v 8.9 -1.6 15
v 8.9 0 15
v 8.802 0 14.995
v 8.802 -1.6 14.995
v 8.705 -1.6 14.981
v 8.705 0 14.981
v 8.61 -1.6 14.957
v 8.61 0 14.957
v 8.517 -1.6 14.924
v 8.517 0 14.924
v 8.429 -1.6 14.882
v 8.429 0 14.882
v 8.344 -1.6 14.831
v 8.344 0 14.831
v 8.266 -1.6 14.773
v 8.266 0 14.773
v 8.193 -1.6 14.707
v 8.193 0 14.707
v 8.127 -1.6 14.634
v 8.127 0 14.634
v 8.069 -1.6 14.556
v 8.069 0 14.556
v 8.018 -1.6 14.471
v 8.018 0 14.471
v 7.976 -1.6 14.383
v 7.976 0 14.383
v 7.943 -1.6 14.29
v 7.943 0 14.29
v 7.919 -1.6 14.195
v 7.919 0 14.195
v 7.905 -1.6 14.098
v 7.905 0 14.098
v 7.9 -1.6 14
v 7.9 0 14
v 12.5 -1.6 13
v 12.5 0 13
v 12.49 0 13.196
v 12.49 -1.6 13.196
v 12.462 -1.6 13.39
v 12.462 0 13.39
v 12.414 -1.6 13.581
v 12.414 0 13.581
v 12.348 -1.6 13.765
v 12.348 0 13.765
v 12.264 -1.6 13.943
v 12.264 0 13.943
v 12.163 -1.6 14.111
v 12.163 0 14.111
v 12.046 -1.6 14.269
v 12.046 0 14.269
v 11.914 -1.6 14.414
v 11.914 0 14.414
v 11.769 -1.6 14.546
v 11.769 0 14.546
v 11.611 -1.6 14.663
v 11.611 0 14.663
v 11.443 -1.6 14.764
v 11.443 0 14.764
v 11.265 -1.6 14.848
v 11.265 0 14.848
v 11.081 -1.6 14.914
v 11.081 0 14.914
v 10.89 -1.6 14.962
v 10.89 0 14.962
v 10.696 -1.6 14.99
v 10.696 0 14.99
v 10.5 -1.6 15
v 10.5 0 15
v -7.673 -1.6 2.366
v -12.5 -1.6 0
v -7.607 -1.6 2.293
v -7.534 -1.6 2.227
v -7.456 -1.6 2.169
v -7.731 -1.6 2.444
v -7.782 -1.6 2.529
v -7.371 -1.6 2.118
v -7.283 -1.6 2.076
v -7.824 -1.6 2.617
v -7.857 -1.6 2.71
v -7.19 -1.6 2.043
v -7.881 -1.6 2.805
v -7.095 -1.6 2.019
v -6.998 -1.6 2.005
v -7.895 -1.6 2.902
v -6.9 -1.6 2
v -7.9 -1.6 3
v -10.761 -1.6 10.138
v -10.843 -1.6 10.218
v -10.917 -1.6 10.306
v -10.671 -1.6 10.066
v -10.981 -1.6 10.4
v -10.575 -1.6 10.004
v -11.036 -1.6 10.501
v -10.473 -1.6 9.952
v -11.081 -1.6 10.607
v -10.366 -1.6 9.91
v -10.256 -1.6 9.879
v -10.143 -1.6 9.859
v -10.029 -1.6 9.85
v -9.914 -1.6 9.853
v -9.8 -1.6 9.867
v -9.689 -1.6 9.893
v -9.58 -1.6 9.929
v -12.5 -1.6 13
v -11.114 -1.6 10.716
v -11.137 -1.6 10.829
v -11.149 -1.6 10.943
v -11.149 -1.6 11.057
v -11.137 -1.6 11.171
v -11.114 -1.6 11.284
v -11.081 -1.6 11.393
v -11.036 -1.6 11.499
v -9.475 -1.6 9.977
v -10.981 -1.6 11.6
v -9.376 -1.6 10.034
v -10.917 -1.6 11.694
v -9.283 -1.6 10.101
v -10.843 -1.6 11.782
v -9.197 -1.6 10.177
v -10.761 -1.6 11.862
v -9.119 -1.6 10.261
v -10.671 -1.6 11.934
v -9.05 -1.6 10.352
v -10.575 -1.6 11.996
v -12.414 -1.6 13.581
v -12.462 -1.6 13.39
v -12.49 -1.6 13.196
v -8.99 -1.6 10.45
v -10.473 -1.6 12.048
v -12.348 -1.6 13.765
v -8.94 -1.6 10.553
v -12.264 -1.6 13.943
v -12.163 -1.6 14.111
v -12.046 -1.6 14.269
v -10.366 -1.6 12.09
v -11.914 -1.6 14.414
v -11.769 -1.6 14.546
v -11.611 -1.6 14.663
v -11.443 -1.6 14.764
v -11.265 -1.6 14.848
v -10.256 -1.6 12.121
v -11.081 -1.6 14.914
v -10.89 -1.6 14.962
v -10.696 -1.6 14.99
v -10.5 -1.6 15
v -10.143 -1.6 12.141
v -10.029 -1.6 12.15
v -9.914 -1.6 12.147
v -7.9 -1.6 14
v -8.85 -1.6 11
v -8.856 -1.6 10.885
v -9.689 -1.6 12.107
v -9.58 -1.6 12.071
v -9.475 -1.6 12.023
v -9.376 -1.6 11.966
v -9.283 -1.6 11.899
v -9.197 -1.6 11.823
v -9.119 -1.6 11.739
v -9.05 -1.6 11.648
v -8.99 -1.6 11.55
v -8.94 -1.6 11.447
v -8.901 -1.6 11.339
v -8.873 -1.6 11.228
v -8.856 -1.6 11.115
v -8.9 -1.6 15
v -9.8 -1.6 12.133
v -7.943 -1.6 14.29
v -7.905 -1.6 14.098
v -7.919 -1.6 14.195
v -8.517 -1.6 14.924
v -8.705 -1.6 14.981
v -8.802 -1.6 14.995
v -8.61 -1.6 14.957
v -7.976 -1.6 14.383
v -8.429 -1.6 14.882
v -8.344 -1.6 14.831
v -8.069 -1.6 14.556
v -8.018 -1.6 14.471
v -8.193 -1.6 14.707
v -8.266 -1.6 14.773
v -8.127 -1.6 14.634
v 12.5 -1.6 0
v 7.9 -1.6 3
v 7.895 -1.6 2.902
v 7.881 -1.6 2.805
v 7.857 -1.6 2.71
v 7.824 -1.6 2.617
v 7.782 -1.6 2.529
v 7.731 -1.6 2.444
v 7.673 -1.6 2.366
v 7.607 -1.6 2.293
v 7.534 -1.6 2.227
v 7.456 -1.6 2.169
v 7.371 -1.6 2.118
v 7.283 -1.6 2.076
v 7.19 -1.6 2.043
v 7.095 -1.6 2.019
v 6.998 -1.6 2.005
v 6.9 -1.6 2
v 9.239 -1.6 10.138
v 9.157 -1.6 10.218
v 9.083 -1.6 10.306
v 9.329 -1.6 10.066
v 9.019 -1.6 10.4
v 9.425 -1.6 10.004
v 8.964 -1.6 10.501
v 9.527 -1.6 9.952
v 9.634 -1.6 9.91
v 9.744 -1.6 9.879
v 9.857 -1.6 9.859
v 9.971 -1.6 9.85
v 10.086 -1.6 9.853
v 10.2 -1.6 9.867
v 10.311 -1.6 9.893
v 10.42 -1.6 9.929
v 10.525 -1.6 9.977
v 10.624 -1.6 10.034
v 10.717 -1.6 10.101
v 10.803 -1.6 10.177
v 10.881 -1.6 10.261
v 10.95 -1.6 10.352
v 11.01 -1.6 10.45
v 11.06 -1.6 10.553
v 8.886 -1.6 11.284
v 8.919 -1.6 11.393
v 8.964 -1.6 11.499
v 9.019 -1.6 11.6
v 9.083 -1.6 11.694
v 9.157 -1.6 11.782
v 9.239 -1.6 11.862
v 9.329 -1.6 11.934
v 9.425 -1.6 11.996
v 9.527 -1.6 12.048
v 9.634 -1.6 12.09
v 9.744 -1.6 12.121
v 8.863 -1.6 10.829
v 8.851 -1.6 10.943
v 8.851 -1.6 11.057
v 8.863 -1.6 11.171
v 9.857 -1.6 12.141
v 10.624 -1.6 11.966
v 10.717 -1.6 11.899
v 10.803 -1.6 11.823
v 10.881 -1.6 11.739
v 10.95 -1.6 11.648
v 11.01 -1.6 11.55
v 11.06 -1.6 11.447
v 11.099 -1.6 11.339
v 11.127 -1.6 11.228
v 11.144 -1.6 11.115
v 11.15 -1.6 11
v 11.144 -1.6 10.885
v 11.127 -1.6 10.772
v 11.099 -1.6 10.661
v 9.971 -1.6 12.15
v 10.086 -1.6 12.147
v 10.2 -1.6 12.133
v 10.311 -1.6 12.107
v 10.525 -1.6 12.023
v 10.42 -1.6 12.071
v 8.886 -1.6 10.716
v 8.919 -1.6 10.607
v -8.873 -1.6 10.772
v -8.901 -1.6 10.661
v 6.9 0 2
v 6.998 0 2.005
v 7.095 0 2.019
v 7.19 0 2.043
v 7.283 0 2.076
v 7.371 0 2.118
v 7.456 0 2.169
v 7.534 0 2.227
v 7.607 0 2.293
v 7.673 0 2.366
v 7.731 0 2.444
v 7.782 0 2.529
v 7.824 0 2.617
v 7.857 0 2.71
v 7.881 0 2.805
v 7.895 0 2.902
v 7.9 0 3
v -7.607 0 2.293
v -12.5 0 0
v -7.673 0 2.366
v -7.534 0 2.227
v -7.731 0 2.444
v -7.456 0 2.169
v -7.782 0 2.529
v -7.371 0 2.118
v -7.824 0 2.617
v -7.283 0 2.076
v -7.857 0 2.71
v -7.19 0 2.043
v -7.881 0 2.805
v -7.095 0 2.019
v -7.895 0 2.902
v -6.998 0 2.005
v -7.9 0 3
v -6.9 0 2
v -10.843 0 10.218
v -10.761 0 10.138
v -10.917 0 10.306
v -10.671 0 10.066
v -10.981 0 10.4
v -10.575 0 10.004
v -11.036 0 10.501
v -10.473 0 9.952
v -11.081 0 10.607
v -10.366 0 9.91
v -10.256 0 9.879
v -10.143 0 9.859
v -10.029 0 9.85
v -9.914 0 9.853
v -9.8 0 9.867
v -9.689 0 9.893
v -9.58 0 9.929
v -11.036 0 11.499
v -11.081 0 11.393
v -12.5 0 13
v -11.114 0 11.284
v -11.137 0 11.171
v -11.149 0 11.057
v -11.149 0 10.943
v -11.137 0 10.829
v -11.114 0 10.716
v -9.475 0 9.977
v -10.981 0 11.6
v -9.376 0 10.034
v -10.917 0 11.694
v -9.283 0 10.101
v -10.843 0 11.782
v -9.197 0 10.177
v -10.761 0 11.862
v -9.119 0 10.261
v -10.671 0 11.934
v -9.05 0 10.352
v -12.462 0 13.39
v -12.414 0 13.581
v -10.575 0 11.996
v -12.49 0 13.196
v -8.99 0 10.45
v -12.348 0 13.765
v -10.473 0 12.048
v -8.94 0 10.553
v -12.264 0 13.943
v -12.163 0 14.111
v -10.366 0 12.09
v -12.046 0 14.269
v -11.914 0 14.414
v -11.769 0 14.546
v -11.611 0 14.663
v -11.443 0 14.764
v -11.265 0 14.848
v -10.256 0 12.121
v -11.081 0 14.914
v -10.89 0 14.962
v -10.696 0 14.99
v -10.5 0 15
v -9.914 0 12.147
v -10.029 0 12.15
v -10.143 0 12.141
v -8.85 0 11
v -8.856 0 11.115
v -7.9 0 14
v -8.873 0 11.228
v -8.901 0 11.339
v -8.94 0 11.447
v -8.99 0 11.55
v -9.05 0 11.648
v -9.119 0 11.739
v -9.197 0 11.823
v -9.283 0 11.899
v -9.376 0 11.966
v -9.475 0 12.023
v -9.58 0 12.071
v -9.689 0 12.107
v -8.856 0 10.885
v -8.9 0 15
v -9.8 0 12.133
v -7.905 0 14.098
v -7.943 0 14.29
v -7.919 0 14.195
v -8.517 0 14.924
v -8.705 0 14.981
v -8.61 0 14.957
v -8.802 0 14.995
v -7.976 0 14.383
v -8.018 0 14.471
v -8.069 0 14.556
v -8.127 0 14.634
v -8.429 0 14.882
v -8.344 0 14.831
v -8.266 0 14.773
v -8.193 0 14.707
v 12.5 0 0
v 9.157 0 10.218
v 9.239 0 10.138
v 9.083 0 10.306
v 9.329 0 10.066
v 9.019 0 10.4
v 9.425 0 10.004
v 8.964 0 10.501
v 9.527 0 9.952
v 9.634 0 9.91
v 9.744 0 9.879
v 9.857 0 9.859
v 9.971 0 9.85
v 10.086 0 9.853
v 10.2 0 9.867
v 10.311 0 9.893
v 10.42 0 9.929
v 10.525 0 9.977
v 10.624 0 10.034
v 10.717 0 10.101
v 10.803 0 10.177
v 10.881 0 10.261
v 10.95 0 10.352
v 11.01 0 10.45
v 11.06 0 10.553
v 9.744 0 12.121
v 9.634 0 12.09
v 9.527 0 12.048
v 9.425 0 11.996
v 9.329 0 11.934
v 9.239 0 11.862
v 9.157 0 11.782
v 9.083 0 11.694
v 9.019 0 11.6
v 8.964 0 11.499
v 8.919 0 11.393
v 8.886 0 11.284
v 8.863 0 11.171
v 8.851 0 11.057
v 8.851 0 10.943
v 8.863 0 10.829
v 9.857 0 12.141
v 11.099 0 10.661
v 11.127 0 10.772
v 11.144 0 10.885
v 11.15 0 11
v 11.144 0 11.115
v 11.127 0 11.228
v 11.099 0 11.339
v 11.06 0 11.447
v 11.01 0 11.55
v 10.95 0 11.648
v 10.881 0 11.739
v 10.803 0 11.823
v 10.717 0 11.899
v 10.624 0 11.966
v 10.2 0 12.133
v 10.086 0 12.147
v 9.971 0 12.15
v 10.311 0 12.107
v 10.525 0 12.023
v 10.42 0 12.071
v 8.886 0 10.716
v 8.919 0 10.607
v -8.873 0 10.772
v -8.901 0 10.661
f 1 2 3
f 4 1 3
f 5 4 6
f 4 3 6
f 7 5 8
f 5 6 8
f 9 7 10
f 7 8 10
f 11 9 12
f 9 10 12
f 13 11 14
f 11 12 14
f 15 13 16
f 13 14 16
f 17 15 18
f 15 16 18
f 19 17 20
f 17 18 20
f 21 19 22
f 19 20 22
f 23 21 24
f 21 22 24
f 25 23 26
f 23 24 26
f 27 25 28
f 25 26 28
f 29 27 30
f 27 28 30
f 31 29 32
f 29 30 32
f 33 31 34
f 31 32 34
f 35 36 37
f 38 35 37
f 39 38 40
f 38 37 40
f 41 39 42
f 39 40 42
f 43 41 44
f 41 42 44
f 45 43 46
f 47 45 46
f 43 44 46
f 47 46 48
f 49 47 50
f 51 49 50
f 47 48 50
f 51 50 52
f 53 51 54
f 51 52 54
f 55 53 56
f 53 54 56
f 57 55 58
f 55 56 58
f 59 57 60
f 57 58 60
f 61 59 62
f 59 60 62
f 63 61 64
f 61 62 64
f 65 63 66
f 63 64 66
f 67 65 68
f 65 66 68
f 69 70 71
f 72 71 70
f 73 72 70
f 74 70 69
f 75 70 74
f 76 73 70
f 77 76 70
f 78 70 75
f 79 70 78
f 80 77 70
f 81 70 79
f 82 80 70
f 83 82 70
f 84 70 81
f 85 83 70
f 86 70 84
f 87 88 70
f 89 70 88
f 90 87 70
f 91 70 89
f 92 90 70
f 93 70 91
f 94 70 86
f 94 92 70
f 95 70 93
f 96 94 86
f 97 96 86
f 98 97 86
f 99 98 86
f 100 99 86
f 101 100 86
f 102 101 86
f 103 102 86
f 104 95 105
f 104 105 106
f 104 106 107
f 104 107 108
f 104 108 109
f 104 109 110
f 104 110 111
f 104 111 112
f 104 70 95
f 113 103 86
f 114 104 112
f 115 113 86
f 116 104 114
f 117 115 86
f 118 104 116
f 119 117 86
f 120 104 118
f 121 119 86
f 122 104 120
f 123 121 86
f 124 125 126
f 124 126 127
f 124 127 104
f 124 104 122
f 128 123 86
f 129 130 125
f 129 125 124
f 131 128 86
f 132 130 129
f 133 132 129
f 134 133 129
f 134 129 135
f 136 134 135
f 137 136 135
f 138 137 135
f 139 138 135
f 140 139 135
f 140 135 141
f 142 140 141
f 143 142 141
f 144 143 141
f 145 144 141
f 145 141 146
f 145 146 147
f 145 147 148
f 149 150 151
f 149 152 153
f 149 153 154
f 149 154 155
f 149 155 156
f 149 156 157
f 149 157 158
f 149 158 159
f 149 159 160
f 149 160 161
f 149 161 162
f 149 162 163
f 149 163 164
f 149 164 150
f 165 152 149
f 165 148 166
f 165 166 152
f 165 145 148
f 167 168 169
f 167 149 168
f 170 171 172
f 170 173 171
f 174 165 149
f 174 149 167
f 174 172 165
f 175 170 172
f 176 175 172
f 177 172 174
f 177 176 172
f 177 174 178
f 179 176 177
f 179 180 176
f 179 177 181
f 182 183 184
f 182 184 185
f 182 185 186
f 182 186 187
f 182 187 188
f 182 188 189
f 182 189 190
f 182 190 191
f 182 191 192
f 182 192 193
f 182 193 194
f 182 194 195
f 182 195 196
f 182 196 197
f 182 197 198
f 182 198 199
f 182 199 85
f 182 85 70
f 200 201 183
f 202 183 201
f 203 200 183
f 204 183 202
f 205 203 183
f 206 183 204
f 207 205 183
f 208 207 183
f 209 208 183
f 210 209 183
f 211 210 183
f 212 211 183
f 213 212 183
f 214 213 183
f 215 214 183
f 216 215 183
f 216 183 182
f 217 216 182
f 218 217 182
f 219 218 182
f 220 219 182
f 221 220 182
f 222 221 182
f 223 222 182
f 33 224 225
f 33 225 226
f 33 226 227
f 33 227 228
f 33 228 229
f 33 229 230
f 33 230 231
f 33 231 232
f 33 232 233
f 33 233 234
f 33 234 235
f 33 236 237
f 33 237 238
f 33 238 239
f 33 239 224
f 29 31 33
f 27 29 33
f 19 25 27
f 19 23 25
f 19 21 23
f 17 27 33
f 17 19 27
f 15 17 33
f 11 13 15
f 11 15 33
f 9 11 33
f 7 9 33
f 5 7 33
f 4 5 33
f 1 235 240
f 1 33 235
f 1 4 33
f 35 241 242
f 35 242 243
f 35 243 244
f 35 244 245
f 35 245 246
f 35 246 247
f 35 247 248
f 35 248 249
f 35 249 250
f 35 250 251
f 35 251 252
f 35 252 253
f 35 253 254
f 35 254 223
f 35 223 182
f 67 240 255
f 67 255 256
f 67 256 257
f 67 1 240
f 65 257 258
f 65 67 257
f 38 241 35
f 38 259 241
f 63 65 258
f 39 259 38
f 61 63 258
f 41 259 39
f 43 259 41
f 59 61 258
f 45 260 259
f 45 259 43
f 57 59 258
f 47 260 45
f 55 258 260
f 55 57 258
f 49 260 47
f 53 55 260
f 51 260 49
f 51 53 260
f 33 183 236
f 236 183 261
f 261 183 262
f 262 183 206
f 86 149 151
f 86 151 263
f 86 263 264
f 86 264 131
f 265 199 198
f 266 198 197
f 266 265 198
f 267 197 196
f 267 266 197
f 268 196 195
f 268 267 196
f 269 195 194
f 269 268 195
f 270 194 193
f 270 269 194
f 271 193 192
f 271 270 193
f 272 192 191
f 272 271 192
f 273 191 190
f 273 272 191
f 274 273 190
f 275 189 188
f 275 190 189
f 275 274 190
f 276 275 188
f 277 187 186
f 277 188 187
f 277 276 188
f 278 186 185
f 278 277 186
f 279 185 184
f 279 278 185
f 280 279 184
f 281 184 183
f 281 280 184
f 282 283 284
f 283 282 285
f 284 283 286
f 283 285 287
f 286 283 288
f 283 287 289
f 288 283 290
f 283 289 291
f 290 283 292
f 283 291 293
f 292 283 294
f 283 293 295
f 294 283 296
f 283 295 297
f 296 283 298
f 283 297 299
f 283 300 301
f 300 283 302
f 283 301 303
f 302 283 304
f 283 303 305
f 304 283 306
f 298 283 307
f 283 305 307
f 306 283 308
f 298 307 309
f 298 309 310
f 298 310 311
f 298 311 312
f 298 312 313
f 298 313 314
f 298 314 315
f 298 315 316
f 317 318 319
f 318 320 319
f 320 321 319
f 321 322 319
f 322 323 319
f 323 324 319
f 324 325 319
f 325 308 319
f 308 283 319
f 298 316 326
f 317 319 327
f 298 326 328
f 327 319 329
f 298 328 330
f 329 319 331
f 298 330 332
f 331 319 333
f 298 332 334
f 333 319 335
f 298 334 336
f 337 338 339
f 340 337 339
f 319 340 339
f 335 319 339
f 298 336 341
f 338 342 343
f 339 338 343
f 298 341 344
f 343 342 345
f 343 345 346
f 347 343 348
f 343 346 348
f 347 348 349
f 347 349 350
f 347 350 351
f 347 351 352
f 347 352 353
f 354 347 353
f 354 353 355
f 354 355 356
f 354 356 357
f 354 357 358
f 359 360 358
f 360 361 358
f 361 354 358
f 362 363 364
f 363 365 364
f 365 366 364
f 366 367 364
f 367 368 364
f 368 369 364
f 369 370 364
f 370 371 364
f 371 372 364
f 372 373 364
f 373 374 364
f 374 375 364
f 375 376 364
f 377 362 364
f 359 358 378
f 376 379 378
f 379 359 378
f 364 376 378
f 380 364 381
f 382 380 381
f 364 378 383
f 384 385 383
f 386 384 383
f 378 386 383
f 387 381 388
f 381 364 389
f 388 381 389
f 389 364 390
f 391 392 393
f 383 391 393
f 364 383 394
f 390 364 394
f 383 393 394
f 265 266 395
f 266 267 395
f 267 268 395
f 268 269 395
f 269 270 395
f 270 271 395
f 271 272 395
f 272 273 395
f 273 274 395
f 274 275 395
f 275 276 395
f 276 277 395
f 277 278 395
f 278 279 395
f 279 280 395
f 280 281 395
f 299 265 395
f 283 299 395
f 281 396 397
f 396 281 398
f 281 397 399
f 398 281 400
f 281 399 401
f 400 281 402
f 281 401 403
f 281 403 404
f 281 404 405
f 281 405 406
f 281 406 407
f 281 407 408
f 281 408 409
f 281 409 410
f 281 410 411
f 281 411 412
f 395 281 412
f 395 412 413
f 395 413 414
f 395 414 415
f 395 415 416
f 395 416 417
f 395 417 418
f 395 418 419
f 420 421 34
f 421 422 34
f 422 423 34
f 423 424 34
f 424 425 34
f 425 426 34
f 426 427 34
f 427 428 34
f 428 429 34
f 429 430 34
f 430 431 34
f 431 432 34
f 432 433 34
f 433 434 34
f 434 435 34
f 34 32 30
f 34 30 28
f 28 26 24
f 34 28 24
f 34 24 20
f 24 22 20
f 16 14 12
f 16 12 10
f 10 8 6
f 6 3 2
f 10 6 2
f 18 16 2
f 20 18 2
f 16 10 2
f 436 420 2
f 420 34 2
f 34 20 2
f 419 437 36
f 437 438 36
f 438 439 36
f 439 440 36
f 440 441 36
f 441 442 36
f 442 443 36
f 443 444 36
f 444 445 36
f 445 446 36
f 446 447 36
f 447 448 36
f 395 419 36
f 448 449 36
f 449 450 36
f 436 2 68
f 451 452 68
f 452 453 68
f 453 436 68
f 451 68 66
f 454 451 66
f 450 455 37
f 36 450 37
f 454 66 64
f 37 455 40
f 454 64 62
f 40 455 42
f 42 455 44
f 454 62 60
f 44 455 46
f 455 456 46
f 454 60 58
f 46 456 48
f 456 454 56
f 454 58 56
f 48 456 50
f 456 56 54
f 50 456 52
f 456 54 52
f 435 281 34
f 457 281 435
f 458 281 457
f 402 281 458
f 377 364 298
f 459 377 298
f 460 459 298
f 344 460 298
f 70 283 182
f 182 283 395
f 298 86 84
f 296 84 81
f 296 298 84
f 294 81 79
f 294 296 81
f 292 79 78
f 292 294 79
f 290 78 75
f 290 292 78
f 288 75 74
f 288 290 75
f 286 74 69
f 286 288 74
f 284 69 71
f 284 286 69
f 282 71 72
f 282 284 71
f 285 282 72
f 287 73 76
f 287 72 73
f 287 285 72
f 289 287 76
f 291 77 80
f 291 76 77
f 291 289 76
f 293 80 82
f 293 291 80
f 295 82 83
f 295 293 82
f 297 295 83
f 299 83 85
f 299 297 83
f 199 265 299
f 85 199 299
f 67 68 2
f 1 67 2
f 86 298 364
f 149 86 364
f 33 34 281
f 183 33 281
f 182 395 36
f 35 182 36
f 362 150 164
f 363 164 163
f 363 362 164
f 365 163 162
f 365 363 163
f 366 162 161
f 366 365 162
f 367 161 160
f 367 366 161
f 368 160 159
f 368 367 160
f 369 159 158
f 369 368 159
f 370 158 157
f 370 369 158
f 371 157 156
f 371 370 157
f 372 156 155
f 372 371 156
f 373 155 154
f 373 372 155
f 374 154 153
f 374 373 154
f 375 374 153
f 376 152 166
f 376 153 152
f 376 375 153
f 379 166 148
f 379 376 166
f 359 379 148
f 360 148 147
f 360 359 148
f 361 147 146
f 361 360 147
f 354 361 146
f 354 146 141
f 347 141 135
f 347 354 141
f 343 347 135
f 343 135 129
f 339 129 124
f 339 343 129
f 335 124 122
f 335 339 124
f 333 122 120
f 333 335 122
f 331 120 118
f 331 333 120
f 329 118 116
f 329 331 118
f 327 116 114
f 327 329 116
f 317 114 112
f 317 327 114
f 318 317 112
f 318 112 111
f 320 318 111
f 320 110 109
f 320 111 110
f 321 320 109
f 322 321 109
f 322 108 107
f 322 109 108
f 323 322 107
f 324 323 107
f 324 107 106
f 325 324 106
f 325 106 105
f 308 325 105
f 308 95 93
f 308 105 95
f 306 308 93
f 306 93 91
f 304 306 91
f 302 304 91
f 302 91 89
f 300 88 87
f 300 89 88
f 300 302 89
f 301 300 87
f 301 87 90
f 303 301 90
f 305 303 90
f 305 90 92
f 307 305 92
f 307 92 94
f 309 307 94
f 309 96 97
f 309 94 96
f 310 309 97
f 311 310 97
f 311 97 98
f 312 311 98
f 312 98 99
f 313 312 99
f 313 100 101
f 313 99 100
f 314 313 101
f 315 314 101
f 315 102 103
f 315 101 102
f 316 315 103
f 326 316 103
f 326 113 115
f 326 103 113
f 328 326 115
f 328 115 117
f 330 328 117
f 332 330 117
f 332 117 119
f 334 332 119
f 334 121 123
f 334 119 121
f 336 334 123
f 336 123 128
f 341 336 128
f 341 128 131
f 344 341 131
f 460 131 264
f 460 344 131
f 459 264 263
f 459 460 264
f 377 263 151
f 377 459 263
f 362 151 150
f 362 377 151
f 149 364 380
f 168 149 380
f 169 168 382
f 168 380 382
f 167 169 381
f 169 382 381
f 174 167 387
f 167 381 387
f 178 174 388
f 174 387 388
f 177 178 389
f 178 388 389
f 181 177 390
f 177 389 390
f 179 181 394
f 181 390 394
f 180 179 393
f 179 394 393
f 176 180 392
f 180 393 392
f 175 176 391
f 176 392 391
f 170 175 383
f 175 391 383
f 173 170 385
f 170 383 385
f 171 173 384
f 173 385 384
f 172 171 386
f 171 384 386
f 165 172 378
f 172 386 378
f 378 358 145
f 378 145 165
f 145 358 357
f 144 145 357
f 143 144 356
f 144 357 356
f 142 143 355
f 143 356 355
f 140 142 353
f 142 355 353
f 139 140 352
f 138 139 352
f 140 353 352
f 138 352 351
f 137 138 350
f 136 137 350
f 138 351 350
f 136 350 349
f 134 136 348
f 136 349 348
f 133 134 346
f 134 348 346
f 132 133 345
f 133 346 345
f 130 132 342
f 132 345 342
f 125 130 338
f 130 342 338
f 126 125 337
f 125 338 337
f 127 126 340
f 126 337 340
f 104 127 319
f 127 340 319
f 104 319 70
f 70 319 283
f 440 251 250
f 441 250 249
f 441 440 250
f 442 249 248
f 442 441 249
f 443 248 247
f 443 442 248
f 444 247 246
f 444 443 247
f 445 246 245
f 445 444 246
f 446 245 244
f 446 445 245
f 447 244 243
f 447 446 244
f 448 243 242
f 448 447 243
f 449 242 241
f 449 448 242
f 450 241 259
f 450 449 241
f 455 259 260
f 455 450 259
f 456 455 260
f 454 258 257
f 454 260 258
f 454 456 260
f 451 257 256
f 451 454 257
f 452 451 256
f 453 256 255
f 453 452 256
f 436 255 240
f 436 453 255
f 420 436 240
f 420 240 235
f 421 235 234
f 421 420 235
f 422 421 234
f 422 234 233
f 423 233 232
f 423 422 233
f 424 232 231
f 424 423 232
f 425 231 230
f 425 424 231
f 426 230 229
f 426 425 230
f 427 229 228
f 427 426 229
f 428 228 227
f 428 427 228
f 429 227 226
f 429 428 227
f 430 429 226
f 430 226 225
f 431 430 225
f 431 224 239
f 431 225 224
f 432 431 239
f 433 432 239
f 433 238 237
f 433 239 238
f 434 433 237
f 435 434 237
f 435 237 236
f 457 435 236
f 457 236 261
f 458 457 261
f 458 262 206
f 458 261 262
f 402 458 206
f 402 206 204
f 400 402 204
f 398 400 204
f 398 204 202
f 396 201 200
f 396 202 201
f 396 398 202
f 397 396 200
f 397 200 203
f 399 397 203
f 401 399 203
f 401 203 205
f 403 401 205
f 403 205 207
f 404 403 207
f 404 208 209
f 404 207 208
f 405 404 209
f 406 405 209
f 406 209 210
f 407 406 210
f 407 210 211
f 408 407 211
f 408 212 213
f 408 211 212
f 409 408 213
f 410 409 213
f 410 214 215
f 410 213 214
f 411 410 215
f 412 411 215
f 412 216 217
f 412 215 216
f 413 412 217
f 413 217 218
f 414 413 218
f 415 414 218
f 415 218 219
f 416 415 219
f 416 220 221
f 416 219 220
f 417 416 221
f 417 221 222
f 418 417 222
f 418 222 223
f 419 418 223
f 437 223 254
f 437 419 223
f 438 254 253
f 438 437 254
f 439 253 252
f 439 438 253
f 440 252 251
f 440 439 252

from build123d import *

# Parameters (mm, degrees)
PAD011_DEPTH    = 1.6
SKETCH027_R     = 1.15
POCKET013_DEPTH = 1.601
POCKET014_DEPTH = 1.601


with BuildPart() as part:
    # Sketch026 → Pad011 (new body)
    with BuildSketch(Plane.XZ):
        with BuildLine():
            Line((-12.5, 0), (12.5, 0))
            Line((12.5, 0), (12.5, 13))
            ThreePointArc((12.5, 13), (11.914214, 14.414214), (10.5, 15))
            Line((10.5, 15), (6.75, 15))
            ThreePointArc((6.75, 15), (6.396447, 14.853553), (6.25, 14.5))
            Line((6.25, 14.5), (6.25, 13.5))
            ThreePointArc((5.75, 13), (6.103553, 13.146447), (6.25, 13.5))
            Line((5.75, 13), (-5.75, 13))
            ThreePointArc((-6.25, 13.5), (-6.103553, 13.146447), (-5.75, 13))
            Line((-6.25, 13.5), (-6.25, 14.5))
            ThreePointArc((-6.25, 14.5), (-6.396447, 14.853553), (-6.75, 15))
            Line((-10.5, 15), (-6.75, 15))
            ThreePointArc((-10.5, 15), (-11.914214, 14.414214), (-12.5, 13))
            Line((-12.5, 13), (-12.5, 0))
        make_face()
    extrude(amount=PAD011_DEPTH)

    # Sketch027 → Pocket013 (cut, through all)
    with BuildSketch(Plane.XZ):
        with Locations((-10, 11)):
            Circle(SKETCH027_R)
        with Locations((10, 11)):
            Circle(SKETCH027_R)
    extrude(amount=POCKET013_DEPTH, mode=Mode.SUBTRACT)

    # Sketch028 → Pocket014 (cut, through all)
    with BuildSketch(Plane.XZ):
        with BuildLine():
            Line((7.9, 14), (7.9, 3))
            ThreePointArc((6.9, 2), (7.607107, 2.292893), (7.9, 3))
            Line((6.9, 2), (-6.9, 2))
            ThreePointArc((-7.9, 3), (-7.607107, 2.292893), (-6.9, 2))
            Line((-7.9, 3), (-7.9, 14))
            ThreePointArc((-7.9, 14), (-8.192893, 14.707107), (-8.9, 15))
            Line((-8.9, 15), (-12.5, 15))
            Line((-12.5, 15), (-12.5, 17))
            Line((-12.5, 17), (12.5, 17))
            Line((12.5, 17), (12.5, 15))
            Line((8.9, 15), (12.5, 15))
            ThreePointArc((8.9, 15), (8.192893, 14.707107), (7.9, 14))
        make_face()
    extrude(amount=POCKET014_DEPTH, mode=Mode.SUBTRACT)


solid = part.part
